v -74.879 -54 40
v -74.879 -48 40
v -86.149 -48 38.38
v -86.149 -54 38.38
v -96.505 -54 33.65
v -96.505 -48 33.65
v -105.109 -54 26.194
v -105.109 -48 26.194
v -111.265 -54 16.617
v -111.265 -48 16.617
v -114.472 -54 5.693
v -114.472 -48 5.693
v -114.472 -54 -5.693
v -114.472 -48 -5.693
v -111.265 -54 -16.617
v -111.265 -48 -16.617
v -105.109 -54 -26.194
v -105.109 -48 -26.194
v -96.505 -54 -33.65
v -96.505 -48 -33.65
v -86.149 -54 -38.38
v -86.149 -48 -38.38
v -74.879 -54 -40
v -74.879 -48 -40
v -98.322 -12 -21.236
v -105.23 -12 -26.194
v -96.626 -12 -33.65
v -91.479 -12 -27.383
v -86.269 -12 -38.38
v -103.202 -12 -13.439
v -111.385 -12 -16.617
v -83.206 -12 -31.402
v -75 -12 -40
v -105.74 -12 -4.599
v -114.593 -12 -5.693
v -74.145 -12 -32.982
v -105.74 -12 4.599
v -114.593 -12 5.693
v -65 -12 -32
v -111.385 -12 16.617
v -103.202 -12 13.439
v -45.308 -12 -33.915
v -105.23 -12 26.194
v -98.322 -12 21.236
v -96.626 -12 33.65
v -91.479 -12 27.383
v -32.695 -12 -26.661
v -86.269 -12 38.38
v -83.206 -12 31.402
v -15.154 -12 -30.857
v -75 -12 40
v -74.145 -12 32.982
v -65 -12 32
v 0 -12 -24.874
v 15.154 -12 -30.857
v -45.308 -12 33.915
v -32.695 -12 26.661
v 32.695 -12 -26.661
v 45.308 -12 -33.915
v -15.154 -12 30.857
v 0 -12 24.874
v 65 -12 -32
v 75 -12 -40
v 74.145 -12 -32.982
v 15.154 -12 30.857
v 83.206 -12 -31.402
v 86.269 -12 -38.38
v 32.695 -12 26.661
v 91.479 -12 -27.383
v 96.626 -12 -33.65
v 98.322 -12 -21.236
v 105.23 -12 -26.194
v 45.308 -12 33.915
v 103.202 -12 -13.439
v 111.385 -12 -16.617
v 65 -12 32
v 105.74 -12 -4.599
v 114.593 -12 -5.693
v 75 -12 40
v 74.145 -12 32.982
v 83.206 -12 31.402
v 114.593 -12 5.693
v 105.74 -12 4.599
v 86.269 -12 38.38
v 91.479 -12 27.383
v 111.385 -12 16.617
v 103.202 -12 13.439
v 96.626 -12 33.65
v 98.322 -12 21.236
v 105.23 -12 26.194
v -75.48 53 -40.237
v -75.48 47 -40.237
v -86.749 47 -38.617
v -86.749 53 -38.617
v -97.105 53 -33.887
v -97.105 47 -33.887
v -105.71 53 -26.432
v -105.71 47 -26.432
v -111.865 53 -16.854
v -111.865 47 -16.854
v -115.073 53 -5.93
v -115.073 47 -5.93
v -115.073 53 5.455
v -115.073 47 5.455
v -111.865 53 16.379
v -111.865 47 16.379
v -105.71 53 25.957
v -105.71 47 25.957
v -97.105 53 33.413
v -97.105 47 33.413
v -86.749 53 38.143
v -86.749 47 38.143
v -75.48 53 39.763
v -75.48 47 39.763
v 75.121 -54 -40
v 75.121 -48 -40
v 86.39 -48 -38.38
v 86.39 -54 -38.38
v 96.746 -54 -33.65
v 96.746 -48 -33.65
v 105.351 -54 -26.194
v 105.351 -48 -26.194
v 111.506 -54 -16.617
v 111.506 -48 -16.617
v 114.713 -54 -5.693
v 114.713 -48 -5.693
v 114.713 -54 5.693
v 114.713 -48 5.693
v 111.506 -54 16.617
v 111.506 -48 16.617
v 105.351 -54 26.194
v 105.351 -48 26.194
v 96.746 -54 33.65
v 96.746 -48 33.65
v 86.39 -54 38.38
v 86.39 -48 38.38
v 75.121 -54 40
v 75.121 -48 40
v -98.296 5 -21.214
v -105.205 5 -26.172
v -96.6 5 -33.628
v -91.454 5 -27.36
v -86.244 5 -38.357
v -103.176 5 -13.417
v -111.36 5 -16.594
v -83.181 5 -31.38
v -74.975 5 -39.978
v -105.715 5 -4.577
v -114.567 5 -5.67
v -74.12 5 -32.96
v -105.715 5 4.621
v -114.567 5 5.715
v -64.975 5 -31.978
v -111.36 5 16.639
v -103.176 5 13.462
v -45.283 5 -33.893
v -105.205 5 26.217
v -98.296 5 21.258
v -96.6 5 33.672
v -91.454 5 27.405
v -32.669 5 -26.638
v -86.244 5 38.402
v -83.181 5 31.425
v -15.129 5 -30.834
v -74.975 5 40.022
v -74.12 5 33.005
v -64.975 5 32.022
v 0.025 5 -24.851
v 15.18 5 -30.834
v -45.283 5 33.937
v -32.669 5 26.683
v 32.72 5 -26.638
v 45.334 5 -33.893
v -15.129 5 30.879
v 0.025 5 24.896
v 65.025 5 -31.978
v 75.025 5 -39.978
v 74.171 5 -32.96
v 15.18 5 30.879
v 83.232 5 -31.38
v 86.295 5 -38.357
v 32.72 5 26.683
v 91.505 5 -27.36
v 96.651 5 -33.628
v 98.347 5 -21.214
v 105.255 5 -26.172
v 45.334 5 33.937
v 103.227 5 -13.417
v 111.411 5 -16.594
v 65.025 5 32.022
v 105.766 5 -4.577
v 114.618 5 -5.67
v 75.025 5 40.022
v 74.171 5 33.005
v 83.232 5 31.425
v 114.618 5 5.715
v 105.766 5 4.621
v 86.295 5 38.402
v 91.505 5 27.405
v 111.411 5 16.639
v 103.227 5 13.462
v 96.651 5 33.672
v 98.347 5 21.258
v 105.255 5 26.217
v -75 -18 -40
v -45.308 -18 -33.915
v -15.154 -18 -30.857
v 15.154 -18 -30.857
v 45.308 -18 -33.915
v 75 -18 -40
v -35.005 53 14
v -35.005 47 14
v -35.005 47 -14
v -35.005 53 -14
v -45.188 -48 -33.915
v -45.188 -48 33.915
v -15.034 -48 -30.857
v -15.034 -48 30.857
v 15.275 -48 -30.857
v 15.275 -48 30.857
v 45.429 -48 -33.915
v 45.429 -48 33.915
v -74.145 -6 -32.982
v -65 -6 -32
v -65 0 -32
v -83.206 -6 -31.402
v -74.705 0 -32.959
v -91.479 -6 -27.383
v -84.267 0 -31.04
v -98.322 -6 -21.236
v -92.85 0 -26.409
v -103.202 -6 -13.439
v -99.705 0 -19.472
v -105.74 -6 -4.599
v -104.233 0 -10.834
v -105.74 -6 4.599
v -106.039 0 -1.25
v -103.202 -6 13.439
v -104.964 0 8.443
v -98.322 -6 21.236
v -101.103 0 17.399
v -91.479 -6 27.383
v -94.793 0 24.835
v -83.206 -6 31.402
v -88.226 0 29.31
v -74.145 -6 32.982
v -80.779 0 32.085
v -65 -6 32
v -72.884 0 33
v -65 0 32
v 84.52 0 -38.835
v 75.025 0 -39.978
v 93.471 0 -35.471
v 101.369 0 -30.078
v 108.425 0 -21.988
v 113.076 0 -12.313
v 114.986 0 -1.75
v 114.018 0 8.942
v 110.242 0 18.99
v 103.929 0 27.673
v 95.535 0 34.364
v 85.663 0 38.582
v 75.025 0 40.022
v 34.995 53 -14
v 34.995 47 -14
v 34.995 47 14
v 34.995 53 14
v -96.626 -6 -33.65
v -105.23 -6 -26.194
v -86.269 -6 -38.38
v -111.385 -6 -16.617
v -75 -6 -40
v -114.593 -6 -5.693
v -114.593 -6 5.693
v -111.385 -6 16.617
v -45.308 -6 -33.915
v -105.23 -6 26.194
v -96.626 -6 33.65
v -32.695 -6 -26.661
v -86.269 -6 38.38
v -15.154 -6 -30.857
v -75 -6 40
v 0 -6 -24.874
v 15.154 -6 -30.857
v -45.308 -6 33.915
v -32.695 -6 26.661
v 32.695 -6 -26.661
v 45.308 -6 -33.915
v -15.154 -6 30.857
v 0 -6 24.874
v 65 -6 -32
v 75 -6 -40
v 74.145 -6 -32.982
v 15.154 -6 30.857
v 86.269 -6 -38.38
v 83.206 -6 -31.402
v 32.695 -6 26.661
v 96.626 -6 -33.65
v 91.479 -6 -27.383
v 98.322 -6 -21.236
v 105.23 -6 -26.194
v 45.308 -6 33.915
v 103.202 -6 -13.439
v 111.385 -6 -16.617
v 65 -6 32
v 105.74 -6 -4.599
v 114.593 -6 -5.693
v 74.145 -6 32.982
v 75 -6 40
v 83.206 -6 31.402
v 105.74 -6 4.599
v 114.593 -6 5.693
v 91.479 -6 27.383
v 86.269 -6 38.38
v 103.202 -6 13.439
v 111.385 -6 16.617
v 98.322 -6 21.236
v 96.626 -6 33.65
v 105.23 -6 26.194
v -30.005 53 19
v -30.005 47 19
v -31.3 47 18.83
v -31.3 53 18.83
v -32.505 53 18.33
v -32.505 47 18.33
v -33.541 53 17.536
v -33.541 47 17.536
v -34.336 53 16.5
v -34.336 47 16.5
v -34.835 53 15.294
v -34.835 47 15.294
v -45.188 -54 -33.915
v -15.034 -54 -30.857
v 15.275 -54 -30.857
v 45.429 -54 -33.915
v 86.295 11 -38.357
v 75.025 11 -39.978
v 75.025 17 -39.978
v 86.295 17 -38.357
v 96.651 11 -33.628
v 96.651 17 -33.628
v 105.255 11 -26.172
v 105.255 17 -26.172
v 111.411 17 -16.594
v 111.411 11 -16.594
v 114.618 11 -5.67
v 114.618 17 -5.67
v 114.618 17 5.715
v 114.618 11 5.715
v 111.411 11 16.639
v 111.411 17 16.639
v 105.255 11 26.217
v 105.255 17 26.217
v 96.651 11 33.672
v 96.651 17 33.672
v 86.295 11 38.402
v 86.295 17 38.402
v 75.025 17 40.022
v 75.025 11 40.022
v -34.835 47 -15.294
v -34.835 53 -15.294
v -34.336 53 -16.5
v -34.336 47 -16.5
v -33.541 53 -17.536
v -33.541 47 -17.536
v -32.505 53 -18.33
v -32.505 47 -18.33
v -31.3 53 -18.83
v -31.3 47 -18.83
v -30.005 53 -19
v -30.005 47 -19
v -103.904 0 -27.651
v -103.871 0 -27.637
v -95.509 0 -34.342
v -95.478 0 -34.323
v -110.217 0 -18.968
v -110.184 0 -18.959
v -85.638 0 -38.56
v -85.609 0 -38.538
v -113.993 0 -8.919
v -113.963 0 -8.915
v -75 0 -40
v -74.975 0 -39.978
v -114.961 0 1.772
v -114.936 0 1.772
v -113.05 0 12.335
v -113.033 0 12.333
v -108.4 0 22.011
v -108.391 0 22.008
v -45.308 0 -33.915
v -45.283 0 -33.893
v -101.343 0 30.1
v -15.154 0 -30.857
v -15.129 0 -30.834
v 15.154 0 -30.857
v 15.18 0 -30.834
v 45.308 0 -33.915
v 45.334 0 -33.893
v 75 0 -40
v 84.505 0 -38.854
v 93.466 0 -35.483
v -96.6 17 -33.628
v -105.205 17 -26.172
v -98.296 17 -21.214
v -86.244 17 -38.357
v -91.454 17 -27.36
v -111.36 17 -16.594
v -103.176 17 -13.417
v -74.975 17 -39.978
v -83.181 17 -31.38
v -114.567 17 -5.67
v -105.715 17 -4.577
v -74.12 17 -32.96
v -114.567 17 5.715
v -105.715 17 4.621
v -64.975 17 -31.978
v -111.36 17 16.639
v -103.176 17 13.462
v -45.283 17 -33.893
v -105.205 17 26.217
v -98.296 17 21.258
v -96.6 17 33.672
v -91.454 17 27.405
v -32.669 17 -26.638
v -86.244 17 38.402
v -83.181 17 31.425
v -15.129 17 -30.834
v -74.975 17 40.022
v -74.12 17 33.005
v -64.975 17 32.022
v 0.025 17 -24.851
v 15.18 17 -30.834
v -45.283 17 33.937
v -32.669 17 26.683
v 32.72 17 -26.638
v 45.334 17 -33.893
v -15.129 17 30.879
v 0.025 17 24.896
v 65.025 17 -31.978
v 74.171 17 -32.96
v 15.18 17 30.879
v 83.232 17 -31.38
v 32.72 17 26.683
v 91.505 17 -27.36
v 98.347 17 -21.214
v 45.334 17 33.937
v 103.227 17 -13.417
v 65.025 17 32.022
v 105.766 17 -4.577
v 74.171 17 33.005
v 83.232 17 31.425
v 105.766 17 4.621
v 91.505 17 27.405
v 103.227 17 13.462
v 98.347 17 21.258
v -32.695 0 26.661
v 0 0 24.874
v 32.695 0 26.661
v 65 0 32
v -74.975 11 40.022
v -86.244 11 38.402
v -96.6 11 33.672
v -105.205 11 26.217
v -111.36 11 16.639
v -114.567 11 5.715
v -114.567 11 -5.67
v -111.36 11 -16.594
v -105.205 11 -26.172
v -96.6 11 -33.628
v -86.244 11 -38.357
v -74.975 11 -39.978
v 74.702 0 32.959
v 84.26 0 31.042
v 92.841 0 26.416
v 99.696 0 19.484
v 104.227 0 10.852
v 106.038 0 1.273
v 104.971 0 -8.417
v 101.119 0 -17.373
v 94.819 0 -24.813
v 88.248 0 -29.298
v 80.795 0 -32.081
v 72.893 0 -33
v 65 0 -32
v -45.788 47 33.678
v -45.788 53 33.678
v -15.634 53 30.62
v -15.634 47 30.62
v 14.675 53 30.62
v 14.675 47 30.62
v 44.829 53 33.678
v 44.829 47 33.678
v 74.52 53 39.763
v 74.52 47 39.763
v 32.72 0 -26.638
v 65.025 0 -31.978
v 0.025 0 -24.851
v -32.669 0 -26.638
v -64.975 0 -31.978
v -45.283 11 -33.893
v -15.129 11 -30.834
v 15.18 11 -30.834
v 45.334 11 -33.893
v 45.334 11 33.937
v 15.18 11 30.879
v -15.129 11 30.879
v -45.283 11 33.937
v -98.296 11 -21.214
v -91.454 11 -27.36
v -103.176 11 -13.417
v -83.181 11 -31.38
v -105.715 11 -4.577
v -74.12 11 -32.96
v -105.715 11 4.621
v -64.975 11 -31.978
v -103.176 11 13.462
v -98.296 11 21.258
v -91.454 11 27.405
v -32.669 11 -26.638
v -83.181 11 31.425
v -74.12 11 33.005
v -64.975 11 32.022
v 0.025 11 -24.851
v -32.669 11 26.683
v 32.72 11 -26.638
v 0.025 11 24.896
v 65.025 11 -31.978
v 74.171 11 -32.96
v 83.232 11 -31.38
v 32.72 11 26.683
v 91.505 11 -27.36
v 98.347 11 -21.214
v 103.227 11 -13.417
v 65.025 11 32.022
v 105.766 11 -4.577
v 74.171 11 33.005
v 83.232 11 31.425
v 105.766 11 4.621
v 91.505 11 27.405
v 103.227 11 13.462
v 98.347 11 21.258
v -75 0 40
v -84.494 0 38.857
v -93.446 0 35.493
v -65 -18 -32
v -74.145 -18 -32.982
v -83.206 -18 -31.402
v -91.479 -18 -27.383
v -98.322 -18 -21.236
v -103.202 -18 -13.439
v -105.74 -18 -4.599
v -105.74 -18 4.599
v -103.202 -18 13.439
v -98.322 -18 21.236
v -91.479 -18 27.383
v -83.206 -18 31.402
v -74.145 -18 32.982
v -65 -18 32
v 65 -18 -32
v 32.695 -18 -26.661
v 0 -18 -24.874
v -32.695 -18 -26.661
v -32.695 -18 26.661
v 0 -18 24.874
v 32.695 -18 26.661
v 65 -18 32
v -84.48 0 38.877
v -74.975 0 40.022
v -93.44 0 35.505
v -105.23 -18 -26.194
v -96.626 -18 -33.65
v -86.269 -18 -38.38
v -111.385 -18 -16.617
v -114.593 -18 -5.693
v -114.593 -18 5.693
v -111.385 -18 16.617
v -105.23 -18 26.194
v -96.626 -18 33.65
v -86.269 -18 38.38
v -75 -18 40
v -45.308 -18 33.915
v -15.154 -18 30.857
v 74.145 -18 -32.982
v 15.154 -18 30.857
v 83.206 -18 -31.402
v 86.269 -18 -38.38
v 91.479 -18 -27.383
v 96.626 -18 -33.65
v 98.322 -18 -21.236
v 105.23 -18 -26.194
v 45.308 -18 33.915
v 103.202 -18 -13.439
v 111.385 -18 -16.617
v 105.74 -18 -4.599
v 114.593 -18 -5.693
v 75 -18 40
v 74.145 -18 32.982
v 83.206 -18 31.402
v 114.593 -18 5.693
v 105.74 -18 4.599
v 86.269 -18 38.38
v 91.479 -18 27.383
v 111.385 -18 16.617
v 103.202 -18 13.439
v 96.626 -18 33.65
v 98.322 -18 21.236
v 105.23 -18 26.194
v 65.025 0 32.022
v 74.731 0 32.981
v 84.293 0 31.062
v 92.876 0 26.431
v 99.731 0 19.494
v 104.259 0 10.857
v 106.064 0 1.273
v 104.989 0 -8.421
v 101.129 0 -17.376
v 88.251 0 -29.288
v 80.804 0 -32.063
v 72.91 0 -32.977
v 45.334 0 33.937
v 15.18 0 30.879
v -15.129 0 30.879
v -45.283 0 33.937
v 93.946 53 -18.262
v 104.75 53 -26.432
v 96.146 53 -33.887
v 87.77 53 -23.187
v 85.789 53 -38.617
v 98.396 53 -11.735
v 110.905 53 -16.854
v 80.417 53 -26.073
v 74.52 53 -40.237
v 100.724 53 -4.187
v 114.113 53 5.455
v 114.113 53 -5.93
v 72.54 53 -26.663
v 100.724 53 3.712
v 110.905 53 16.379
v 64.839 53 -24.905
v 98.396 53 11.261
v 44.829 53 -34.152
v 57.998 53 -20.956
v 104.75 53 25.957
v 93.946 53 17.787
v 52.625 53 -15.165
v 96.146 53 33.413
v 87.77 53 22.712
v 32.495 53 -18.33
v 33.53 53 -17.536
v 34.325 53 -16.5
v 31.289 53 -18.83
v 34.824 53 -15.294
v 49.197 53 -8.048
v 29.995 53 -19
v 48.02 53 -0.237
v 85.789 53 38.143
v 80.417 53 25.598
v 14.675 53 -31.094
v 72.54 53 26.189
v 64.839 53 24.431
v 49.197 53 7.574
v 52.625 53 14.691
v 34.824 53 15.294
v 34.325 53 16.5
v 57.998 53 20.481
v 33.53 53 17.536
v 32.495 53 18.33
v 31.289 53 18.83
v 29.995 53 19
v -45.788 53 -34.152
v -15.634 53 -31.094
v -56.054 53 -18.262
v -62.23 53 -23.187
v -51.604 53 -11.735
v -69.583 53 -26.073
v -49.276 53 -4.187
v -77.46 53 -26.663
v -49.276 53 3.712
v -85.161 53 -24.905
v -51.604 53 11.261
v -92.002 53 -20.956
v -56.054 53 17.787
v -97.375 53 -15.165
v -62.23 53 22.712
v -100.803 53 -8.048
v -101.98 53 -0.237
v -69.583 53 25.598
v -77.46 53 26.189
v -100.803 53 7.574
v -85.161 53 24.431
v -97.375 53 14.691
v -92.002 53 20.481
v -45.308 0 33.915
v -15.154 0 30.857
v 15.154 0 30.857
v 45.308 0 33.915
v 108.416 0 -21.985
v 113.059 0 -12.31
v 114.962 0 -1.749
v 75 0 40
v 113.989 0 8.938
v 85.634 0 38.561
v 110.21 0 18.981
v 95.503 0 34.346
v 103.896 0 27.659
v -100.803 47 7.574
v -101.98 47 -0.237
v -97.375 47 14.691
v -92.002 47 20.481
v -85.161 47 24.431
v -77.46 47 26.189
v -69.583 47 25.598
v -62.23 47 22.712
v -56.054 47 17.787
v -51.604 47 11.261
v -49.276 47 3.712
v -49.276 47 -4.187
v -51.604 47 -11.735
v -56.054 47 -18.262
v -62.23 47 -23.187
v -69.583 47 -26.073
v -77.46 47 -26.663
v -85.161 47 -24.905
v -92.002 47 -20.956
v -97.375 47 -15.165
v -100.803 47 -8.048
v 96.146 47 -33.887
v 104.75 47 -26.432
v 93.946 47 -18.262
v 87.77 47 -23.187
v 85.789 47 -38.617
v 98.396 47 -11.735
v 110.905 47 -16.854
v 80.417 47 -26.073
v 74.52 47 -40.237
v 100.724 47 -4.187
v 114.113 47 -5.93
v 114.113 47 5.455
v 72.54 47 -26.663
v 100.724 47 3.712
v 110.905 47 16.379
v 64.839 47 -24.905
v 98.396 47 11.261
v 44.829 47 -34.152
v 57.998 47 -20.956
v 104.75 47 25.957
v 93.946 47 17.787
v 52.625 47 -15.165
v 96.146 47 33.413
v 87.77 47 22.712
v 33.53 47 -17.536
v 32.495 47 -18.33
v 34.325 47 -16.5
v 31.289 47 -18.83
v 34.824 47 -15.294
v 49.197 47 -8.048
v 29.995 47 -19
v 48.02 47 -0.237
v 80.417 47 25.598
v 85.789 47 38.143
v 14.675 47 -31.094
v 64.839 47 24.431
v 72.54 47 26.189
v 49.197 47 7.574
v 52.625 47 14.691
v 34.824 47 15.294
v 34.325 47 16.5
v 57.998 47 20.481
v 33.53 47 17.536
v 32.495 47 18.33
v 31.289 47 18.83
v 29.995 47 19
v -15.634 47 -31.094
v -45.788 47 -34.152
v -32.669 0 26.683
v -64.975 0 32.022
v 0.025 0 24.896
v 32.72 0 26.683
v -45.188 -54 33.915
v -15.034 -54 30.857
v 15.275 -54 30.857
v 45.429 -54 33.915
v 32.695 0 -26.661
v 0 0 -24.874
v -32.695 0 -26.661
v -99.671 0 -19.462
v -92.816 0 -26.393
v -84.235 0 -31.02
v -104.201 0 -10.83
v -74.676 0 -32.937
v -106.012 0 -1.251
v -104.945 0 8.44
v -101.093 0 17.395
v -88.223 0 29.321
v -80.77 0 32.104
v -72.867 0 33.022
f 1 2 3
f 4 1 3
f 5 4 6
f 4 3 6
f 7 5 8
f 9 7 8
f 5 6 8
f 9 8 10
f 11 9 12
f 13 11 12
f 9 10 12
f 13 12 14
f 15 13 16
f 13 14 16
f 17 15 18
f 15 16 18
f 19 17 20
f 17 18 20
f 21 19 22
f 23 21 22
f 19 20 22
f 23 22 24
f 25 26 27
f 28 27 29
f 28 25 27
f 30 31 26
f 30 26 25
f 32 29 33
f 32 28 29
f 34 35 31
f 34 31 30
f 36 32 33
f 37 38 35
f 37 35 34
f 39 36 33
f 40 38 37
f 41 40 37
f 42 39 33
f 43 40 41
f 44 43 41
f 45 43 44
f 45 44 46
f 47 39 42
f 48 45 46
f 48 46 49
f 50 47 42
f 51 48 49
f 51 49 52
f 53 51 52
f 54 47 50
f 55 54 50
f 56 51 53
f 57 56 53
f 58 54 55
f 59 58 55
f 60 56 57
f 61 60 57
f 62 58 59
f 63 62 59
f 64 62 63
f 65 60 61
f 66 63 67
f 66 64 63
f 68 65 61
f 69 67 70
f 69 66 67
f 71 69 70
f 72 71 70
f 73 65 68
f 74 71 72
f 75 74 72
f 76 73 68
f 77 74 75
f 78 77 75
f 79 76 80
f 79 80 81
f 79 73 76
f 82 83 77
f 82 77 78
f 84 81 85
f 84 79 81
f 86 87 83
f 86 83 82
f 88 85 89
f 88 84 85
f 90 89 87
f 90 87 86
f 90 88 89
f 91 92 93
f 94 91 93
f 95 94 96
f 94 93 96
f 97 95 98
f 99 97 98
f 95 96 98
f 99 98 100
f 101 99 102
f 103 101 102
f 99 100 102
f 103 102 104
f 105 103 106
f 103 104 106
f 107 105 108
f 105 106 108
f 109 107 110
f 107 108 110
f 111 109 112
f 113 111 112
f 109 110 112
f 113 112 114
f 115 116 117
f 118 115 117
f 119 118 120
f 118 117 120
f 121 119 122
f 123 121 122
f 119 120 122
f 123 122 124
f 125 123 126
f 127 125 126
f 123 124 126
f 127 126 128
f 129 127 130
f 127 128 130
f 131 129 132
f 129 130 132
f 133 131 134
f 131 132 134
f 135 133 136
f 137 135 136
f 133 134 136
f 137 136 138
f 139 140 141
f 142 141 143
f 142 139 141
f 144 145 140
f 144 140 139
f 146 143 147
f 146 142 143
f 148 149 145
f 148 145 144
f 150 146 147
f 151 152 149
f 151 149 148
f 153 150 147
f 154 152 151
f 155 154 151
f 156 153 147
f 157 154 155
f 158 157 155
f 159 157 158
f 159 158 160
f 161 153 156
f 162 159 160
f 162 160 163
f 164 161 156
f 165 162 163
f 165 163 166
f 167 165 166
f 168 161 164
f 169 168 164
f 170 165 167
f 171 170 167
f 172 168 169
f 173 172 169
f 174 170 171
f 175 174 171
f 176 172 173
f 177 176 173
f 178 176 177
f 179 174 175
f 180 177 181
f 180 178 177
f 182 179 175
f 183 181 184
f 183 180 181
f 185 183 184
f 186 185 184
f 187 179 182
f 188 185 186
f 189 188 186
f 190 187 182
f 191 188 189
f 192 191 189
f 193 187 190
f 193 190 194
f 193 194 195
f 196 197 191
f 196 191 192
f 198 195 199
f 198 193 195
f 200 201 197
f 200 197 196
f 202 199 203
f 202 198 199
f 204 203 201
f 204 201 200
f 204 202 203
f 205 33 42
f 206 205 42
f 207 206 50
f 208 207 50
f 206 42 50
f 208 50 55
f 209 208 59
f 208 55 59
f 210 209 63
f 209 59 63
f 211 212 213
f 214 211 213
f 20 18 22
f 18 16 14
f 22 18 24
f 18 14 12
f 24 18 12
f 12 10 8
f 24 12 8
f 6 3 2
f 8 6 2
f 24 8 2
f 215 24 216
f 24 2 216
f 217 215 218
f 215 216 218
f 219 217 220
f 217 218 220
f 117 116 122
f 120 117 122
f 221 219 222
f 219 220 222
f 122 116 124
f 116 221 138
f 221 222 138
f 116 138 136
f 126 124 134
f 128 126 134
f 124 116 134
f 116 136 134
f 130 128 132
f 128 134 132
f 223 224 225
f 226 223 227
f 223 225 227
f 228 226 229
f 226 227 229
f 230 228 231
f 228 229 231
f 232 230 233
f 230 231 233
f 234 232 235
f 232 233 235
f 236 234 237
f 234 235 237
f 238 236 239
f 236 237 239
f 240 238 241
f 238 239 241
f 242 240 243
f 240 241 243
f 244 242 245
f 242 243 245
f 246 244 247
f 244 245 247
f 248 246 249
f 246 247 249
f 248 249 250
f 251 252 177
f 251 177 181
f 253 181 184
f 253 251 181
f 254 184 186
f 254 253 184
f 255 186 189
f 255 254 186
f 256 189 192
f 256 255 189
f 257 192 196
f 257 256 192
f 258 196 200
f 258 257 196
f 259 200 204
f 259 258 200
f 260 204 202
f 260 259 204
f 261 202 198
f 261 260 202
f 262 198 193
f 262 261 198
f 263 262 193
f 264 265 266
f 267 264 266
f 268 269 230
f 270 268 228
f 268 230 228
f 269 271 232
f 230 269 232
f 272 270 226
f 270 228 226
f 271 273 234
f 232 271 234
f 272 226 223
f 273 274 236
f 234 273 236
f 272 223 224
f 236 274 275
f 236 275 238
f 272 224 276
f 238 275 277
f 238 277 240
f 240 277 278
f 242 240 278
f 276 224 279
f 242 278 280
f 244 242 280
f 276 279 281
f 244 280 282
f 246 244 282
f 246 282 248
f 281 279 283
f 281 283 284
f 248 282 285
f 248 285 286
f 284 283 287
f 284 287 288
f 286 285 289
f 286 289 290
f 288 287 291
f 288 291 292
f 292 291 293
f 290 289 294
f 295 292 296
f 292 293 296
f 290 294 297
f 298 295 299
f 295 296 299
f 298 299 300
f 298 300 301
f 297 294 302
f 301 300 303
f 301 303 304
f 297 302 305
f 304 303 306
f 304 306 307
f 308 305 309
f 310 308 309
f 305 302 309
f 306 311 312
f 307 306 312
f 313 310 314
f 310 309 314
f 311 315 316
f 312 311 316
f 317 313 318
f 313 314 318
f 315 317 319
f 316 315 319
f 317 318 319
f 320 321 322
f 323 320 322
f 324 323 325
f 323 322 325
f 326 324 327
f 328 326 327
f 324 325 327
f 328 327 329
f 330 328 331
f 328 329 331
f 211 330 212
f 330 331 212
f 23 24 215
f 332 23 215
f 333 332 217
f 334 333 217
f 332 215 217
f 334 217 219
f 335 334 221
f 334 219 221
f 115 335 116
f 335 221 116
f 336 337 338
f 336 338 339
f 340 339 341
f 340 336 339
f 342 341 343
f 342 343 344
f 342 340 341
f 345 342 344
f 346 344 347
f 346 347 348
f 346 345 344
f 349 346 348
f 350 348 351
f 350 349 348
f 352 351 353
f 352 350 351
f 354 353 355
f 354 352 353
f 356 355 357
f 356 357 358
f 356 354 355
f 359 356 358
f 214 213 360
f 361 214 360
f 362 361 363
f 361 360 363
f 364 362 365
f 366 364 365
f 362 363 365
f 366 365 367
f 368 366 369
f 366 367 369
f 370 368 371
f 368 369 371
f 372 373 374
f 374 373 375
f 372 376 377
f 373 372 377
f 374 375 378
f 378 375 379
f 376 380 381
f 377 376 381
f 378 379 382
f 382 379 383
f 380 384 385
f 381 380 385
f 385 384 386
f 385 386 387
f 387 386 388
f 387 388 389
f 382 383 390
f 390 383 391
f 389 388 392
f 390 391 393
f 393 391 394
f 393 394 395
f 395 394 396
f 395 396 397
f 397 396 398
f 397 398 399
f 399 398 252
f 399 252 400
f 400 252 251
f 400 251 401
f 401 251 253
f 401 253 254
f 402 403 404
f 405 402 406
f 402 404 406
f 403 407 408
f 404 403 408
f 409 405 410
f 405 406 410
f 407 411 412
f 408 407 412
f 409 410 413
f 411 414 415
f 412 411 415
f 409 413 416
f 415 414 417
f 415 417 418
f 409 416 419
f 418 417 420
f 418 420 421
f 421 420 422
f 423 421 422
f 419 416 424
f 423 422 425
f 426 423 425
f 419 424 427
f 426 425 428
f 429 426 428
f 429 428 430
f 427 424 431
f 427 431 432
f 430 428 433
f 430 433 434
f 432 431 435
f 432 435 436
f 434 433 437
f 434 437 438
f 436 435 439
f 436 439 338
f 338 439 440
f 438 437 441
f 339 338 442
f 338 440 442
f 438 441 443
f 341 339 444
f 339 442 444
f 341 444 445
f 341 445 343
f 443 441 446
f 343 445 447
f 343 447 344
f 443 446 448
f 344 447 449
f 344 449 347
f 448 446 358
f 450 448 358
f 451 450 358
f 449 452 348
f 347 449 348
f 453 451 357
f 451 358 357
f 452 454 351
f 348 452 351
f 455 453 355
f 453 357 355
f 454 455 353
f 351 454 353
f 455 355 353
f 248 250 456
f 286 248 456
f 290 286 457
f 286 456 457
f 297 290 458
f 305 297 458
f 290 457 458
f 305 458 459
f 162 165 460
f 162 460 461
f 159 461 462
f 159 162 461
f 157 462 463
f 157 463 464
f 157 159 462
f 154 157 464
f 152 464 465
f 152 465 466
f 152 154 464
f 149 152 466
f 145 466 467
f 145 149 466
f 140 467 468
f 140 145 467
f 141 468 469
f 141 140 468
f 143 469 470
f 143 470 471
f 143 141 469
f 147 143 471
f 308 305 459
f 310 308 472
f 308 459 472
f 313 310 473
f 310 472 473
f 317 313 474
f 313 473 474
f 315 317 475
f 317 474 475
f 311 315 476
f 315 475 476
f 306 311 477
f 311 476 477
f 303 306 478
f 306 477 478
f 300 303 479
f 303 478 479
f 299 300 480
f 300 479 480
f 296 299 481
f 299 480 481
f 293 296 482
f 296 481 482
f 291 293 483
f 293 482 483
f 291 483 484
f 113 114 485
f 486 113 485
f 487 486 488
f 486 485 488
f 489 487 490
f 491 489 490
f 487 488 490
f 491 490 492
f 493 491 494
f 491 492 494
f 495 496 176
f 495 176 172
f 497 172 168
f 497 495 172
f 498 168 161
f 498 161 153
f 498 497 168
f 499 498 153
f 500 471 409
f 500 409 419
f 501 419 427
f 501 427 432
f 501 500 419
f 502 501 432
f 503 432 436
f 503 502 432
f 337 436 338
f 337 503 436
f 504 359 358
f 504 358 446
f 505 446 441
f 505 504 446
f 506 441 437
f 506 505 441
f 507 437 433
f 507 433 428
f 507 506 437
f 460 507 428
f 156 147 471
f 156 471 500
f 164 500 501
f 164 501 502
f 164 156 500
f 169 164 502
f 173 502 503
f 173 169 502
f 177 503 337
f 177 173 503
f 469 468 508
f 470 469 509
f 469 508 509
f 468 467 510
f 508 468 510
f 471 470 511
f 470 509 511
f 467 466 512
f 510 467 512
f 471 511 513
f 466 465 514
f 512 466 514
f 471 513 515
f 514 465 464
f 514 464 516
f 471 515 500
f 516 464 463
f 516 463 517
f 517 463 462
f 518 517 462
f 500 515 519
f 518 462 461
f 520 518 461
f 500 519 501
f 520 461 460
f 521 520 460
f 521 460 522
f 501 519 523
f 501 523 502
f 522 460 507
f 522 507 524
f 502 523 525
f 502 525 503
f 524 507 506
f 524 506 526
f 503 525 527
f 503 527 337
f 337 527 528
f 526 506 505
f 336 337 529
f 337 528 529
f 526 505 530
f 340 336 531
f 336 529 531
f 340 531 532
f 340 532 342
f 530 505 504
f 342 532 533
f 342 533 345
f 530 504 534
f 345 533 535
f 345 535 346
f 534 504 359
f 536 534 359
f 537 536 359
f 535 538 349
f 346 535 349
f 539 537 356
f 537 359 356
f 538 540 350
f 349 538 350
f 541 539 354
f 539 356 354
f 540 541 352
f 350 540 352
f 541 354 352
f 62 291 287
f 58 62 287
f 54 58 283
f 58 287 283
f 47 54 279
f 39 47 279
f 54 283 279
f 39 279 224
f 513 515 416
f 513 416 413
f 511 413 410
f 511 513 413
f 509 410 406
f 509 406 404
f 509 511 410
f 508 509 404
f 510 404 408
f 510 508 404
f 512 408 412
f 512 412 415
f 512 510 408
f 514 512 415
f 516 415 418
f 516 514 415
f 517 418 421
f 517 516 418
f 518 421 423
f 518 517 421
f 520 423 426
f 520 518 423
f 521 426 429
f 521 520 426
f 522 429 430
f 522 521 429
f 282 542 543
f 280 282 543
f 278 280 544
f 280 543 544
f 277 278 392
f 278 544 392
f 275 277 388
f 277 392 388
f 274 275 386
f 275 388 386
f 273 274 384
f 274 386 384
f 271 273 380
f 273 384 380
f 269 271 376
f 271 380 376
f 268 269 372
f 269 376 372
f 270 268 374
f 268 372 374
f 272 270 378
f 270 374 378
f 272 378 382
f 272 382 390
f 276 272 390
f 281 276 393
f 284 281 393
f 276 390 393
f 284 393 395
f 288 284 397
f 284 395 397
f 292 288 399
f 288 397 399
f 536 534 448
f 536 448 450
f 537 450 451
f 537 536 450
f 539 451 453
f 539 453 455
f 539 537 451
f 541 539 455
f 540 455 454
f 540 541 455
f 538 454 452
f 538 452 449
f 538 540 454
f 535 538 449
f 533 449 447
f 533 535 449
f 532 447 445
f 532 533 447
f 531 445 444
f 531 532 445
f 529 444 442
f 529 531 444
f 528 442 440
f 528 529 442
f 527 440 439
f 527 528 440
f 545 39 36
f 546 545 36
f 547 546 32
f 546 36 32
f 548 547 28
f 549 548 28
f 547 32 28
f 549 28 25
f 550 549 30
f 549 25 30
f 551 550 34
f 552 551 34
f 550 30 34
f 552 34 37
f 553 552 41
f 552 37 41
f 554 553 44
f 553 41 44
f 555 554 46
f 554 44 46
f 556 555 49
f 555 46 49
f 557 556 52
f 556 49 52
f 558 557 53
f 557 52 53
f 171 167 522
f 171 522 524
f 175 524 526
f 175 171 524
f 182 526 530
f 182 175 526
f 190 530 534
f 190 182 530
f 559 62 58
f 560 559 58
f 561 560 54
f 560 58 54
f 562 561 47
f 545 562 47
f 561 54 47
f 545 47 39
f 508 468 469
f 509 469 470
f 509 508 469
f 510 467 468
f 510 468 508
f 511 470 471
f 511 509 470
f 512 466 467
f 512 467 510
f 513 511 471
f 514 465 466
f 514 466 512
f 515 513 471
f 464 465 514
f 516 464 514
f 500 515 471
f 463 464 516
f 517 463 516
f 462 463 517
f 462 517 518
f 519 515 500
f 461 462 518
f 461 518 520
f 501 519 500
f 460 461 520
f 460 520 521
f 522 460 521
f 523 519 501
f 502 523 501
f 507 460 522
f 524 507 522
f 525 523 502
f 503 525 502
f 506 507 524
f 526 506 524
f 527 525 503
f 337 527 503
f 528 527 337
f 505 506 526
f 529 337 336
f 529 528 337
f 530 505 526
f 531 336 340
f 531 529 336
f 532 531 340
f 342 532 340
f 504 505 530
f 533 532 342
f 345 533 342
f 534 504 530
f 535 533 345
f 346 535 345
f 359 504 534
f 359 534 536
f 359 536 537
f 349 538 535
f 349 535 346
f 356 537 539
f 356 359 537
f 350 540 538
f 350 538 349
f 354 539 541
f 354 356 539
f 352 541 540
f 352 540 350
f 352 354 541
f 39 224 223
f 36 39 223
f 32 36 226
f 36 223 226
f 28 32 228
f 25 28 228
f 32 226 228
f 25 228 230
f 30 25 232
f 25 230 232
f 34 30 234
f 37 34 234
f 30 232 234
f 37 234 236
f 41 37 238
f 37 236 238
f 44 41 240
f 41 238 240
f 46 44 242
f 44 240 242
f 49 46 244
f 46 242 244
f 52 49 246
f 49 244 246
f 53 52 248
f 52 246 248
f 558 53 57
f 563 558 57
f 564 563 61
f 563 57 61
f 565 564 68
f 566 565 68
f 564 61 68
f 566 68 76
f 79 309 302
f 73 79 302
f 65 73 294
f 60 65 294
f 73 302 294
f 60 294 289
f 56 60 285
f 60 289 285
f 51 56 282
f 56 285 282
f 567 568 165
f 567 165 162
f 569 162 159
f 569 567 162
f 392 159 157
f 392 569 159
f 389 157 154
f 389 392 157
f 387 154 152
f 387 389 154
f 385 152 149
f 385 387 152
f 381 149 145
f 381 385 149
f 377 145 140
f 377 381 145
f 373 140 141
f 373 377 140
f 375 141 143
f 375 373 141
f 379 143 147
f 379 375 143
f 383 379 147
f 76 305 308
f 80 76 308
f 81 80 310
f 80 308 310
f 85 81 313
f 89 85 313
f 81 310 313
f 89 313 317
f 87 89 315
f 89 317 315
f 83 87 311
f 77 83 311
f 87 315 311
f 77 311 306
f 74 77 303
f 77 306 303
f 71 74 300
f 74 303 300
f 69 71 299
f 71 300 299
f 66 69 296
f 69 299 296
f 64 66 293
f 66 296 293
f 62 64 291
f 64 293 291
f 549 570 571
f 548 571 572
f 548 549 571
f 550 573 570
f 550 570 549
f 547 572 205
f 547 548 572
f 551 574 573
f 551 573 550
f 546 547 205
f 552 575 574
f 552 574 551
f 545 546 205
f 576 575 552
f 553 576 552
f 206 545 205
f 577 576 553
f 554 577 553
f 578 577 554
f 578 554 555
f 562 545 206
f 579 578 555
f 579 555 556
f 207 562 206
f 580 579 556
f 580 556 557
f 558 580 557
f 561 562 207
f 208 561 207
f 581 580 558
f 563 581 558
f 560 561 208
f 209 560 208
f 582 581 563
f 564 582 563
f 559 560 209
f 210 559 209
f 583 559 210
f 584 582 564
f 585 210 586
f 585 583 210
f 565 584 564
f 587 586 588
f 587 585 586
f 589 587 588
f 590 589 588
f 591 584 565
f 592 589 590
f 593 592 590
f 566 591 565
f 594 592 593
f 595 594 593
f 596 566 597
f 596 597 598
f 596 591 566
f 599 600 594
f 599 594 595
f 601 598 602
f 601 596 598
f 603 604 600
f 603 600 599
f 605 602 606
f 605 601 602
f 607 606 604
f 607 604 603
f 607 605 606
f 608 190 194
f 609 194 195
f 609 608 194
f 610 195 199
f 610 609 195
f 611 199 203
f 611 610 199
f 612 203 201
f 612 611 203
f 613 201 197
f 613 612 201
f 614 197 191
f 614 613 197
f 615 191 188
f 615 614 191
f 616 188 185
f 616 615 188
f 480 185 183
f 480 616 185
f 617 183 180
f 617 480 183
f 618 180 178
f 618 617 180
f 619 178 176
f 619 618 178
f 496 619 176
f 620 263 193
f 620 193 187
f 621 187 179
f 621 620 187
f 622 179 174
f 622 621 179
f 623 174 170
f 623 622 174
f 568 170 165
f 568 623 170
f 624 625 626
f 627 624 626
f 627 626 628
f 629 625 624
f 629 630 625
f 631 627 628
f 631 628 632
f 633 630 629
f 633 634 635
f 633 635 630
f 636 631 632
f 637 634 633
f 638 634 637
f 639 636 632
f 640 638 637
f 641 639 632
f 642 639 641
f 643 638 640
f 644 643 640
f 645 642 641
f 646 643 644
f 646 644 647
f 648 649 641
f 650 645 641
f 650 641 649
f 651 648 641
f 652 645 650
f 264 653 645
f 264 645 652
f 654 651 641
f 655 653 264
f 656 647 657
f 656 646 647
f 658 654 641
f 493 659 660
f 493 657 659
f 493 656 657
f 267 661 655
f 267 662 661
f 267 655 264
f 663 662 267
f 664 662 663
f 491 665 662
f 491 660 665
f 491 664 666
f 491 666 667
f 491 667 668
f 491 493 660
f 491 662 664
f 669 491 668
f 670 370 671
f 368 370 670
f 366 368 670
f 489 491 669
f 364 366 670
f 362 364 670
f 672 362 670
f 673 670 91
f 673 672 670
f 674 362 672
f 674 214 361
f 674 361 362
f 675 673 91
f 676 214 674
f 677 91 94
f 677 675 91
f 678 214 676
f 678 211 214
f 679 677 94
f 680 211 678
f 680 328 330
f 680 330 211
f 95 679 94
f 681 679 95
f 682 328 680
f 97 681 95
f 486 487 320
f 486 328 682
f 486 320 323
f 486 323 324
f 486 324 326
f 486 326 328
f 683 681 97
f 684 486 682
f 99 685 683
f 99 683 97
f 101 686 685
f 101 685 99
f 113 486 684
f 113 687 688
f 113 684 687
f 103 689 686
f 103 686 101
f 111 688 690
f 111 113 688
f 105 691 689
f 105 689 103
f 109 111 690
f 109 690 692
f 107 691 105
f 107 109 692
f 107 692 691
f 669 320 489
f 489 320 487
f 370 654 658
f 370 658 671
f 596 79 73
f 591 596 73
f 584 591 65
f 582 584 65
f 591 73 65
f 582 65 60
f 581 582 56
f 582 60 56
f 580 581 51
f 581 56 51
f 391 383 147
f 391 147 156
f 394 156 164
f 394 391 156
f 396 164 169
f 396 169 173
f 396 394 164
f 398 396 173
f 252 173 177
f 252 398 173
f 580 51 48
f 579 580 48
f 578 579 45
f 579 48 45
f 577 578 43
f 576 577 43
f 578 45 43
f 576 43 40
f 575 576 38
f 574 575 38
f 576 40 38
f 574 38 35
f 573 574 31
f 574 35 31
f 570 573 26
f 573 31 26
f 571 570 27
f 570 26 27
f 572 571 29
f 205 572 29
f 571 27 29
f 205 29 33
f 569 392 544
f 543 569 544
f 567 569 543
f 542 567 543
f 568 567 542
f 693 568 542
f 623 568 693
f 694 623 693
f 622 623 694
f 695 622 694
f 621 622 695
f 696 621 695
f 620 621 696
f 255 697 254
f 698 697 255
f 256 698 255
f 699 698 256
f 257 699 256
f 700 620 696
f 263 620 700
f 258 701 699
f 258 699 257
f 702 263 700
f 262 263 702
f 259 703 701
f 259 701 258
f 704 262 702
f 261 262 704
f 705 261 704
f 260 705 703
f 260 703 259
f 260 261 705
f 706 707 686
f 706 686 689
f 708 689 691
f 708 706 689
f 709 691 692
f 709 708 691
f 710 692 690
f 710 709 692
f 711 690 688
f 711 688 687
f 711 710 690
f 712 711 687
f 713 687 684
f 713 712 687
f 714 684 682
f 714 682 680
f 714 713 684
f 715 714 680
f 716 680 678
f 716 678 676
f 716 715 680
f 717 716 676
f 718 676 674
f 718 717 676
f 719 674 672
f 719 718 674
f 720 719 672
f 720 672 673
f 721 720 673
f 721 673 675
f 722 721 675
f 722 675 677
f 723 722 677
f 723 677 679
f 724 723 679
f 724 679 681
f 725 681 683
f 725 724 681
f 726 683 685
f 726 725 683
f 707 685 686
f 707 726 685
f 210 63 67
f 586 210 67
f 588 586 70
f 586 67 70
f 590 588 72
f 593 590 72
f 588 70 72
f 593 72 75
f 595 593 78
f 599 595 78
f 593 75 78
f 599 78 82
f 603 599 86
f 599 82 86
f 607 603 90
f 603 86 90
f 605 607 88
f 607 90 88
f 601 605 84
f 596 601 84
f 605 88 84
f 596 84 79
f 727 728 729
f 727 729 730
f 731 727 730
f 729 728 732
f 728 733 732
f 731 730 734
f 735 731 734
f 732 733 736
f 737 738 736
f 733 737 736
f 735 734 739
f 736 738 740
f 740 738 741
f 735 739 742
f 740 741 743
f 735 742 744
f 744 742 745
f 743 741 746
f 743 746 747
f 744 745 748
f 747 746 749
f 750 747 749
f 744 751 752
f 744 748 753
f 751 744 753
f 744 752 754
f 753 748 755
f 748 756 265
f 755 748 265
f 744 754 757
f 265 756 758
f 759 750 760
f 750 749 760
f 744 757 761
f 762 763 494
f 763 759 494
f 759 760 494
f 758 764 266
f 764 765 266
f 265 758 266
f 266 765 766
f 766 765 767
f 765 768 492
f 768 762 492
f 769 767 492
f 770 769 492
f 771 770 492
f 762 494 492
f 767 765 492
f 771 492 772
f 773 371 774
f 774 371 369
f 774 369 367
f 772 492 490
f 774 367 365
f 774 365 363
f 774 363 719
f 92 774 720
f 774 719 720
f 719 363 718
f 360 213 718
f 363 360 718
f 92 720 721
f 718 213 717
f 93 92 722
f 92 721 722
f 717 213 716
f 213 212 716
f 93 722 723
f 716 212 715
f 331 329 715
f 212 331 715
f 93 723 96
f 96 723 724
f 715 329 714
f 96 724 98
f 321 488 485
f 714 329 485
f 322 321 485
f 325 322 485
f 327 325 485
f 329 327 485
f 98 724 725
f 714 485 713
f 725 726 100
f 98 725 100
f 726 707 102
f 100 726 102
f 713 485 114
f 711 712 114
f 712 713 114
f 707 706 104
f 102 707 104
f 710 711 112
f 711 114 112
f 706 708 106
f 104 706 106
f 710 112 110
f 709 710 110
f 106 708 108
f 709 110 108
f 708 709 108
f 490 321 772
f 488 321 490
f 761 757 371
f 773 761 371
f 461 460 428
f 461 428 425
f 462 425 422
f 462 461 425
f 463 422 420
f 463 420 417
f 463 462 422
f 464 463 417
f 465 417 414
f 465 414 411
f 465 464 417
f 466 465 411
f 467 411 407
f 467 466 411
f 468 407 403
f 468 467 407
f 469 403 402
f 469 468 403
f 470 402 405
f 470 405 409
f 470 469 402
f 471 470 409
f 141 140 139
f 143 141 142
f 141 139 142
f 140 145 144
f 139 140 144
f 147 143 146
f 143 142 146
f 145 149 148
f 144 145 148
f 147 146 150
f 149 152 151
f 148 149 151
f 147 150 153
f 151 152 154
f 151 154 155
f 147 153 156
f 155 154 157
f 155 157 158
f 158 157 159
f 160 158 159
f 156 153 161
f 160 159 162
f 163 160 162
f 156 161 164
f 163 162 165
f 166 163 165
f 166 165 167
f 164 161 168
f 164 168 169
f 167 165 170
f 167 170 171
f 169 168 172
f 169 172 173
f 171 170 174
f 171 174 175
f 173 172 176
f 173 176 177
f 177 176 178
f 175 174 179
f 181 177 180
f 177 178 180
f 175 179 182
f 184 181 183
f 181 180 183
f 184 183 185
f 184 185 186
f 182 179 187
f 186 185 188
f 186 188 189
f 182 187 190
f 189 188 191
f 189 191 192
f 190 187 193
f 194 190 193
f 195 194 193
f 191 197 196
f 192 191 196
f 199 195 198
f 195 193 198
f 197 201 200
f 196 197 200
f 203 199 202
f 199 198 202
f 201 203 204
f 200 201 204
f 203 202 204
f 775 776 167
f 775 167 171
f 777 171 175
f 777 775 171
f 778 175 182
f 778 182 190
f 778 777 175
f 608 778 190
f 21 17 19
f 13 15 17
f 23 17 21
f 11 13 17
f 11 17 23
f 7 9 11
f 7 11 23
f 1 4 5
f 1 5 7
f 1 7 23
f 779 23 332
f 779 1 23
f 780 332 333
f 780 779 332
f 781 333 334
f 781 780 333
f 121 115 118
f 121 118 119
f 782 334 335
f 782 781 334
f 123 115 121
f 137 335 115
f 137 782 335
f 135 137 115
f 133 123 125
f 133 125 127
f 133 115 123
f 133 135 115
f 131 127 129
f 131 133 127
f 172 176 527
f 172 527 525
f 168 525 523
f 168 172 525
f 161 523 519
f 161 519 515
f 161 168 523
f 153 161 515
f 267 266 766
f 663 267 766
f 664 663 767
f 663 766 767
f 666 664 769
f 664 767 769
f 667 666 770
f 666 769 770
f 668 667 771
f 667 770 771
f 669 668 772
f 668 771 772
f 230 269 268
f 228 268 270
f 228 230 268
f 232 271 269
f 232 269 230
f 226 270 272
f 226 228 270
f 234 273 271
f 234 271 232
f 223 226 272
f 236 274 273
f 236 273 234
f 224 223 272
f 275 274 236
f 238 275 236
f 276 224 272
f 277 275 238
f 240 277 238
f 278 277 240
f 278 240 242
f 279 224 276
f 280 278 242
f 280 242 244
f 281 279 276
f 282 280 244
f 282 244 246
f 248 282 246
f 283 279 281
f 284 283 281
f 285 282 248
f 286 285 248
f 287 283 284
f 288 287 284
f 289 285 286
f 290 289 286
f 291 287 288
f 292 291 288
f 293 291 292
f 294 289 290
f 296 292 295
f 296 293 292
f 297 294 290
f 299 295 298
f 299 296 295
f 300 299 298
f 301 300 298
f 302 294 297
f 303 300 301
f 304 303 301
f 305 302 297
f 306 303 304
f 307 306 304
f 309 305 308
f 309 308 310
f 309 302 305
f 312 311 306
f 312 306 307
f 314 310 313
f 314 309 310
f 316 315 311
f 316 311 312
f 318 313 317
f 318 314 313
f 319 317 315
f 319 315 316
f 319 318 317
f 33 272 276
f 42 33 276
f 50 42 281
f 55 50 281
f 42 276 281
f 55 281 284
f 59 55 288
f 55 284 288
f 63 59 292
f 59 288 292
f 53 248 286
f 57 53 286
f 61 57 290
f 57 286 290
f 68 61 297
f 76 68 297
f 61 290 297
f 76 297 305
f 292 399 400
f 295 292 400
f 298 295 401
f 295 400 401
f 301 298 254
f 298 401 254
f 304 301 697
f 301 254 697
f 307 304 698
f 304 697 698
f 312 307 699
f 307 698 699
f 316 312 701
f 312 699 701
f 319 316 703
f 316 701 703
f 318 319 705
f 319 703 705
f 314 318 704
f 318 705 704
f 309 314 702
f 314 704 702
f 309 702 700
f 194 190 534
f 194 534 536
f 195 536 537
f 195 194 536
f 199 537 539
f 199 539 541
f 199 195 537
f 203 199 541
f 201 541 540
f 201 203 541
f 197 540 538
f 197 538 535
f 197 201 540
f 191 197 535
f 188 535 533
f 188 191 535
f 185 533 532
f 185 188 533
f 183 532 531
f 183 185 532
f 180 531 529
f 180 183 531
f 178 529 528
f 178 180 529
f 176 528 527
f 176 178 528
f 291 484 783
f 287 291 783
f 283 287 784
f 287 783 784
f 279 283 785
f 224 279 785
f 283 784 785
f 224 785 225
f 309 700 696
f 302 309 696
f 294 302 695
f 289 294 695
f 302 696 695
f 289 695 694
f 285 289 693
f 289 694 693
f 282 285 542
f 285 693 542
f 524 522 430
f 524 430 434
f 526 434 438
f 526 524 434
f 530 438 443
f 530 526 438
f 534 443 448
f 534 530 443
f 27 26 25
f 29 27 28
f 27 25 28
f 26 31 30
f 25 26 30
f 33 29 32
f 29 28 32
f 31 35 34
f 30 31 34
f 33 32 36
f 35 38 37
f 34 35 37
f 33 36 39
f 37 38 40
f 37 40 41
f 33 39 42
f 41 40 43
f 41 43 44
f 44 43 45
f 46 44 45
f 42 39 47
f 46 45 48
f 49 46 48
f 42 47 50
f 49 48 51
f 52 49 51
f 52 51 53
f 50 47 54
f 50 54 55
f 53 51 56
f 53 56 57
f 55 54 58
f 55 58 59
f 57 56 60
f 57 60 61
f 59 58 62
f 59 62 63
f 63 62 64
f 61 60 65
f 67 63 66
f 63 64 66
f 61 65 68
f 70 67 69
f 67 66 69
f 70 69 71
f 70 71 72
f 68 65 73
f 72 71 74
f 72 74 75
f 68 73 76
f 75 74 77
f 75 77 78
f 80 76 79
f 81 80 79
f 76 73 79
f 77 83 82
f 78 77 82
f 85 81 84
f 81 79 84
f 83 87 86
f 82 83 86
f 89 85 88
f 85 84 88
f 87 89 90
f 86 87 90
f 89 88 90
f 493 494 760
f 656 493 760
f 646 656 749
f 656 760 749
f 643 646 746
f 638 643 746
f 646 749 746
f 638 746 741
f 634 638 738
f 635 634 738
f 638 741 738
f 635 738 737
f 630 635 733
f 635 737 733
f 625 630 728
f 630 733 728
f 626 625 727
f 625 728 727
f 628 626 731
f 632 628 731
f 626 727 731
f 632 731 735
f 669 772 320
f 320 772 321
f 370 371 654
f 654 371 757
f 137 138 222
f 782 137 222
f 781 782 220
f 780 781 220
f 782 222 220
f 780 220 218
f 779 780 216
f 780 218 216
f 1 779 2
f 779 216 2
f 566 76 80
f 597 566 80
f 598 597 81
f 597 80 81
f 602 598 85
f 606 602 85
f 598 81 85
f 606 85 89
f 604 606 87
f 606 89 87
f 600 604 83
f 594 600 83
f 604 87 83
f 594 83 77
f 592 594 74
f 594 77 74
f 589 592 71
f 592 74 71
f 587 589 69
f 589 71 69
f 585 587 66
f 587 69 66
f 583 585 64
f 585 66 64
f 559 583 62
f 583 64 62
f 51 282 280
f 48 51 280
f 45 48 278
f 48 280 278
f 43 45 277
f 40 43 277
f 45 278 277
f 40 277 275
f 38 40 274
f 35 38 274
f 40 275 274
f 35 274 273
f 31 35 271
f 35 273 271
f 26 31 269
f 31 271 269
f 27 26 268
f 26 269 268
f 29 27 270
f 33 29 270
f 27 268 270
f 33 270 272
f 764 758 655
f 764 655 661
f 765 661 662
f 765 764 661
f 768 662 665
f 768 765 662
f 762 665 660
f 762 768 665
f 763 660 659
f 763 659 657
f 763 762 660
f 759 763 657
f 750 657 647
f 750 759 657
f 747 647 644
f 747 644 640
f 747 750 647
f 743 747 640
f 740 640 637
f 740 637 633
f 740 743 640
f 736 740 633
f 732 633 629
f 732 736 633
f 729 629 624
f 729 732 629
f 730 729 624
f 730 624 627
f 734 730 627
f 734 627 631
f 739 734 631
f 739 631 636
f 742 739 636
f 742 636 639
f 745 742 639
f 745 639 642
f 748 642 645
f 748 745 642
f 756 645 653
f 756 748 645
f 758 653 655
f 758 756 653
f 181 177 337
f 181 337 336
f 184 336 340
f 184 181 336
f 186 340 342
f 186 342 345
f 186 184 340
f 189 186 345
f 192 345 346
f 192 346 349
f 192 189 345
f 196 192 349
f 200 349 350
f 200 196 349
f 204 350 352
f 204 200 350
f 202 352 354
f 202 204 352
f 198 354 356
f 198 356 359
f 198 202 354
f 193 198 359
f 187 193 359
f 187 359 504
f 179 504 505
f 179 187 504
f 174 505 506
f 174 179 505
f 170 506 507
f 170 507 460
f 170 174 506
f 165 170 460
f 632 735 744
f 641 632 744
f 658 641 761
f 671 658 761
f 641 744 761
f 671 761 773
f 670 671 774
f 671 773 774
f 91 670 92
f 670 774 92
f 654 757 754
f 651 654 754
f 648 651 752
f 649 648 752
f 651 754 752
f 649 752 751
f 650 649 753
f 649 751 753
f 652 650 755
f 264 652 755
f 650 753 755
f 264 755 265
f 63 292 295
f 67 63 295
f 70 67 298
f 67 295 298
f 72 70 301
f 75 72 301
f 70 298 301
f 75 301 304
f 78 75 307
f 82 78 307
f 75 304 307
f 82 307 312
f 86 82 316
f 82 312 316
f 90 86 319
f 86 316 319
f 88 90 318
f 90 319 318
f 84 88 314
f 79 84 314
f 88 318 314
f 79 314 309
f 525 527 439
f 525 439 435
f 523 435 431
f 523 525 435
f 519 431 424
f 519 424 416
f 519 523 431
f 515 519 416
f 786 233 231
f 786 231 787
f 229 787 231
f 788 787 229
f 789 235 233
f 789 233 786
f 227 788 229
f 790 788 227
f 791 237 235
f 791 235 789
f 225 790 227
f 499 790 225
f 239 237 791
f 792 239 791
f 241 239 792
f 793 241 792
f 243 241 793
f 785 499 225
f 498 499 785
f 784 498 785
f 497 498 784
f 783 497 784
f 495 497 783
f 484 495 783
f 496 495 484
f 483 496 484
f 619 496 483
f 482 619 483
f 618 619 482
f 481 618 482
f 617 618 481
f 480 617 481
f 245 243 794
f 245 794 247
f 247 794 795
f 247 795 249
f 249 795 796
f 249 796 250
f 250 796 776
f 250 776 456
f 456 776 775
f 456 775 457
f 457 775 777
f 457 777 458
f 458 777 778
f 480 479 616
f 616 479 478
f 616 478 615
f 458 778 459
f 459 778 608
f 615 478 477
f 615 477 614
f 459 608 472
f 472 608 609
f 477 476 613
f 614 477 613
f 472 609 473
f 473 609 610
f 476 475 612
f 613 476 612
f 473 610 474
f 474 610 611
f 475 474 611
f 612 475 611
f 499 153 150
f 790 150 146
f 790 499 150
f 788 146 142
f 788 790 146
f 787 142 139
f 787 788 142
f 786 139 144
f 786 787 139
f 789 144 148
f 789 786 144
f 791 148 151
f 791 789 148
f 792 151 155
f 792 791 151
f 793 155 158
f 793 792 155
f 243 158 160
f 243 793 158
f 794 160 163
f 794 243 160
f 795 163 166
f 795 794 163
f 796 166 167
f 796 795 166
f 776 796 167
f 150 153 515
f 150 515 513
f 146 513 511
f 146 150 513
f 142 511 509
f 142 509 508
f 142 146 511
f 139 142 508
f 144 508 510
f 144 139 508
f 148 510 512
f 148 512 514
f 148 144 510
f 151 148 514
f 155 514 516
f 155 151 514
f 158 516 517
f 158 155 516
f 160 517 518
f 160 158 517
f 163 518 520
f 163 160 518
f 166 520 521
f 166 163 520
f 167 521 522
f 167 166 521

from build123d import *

# Parameters (mm, degrees)
F1_DEPTH  = 6
F3_DEPTH  = 5
F4_DEPTH  = 6
F5_DEPTH  = 6
F6_DEPTH  = 6
F7_DEPTH  = 6
F10_DEPTH = 6
F12_R     = 26.5
F13_DEPTH = 6


with BuildPart() as f1:
    # F0 (on Front) → F1 (new body)
    with BuildSketch(Plane.XZ):
        with BuildLine():
            ThreePointArc((-75, -40), (0, -30.4737509656), (75, -40))
            ThreePointArc((75, -40), (115, 0), (75, 40))
            ThreePointArc((75, 40), (0, 30.4737509656), (-75, 40))
            ThreePointArc((-75, 40), (-115, 0), (-75, -40))
        make_face()
        with BuildLine():
            ThreePointArc((-65, -32), (-106.0622577483, 0), (-65, 32))
            ThreePointArc((-65, 32), (0, 24.8736929121), (65, 32))
            ThreePointArc((65, 32), (106.0622577483, 0), (65, -32))
            ThreePointArc((65, -32), (0, -24.8736929121), (-65, -32))
        make_face(mode=Mode.SUBTRACT)
    extrude(amount=F1_DEPTH)

    # F2 (on Front) → F3 (join)
    with BuildSketch(Plane.XZ):
        with BuildLine():
            ThreePointArc((-74.9745267705, -39.977687401), (0.0254732295, -30.4514383666), (75.0254732295, -39.977687401))
            ThreePointArc((75.0254732295, -39.977687401), (115.0254732295, 0.022312599), (75.0254732295, 40.022312599))
            ThreePointArc((75.0254732295, 40.022312599), (0.0254732295, 30.4960635645), (-74.9745267705, 40.022312599))
            ThreePointArc((-74.9745267705, 40.022312599), (-114.9745267705, 0.022312599), (-74.9745267705, -39.977687401))
        make_face()
        with BuildLine():
            ThreePointArc((-64.9745267705, -31.977687401), (-106.0367845188, 0.022312599), (-64.9745267705, 32.022312599))
            ThreePointArc((-64.9745267705, 32.022312599), (0.0254732295, 24.8960055111), (65.0254732295, 32.022312599))
            ThreePointArc((65.0254732295, 32.022312599), (106.0877309778, 0.022312599), (65.0254732295, -31.977687401))
            ThreePointArc((65.0254732295, -31.977687401), (0.0254732295, -24.8513803132), (-64.9745267705, -31.977687401))
        make_face(mode=Mode.SUBTRACT)
    extrude(amount=-F3_DEPTH)


with BuildPart() as f4:
    # F4 (new): a face of the model
    f4_faces = [f1.part.faces().sort_by_distance(p)[0] for p in [
        (112.5648408676, -6, 0),
    ]]
    extrude(f4_faces, amount=F4_DEPTH)


with BuildPart() as f5:
    # F5 (new): a face of the model
    f5_faces = [f1.part.faces().sort_by_distance(p)[0] for p in [
        (0.0254732295, 5, -28.0162792342),
    ]]
    extrude(f5_faces, amount=F5_DEPTH)


with BuildPart() as f6:
    # F6 (new): a face of the model
    f6_faces = [f5.part.faces().sort_by_distance(p)[0] for p in [
        (0.0254732295, 11, -28.0162792342),
    ]]
    extrude(f6_faces, amount=F6_DEPTH)


with BuildPart() as f7:
    # F7 (new): a face of the model
    f7_faces = [f4.part.faces().sort_by_distance(p)[0] for p in [
        (112.5648408676, -12, 0),
    ]]
    extrude(f7_faces, amount=F7_DEPTH)


with BuildPart() as f10:
    # F9 (on offset) → F10 (new body)
    with BuildSketch(Plane.XZ.offset(48)):
        with BuildLine():
            ThreePointArc((-74.8794772328, -40), (0.1205227672, -30.4737509656), (75.1205227672, -40))
            ThreePointArc((75.1205227672, -40), (115.1205227672, 0), (75.1205227672, 40))
            ThreePointArc((75.1205227672, 40), (0.1205227672, 30.4737509656), (-74.8794772328, 40))
            ThreePointArc((-74.8794772328, 40), (-114.8794772328, 0), (-74.8794772328, -40))
        make_face()
    extrude(amount=F10_DEPTH)


with BuildPart() as f13:
    # F12 (on offset) → F13 (new body)
    with BuildSketch(Plane(origin=(0, 47, 0), x_dir=(-1, 0, 0), z_dir=(0, 1, 0))):
        with BuildLine():
            ThreePointArc((-74.5201730926, -40.2371987939), (0.4798269074, -30.7109497595), (75.4798269074, -40.2371987939))
            ThreePointArc((75.4798269074, -40.2371987939), (115.4798269074, -0.2371987939), (75.4798269074, 39.7628012061))
            ThreePointArc((75.4798269074, 39.7628012061), (0.4798269074, 30.2365521716), (-74.5201730926, 39.7628012061))
            ThreePointArc((-74.5201730926, 39.7628012061), (-114.5201730926, -0.2371987939), (-74.5201730926, -40.2371987939))
        make_face()
        with Locations((-74.5201730926, -0.2371987939)):
            Circle(F12_R, mode=Mode.SUBTRACT)
        with BuildLine():
            Line((-29.9945702561, 19), (30.0054297439, 19))
            ThreePointArc((30.0054297439, 19), (33.5409636498, 17.5355339059), (35.0054297439, 14))
            Line((35.0054297439, 14), (35.0054297439, -14))
            ThreePointArc((35.0054297439, -14), (33.5409636498, -17.5355339059), (30.0054297439, -19))
            Line((30.0054297439, -19), (-29.9945702561, -19))
            ThreePointArc((-29.9945702561, -19), (-33.5301041621, -17.5355339059), (-34.9945702561, -14))
            Line((-34.9945702561, -14), (-34.9945702561, 14))
            ThreePointArc((-34.9945702561, 14), (-33.5301041621, 17.5355339059), (-29.9945702561, 19))
        make_face(mode=Mode.SUBTRACT)
        with Locations((75.4798269074, -0.2371987939)):
            Circle(F12_R, mode=Mode.SUBTRACT)
    extrude(amount=F13_DEPTH)


solid = Compound([f1.part, f4.part, f5.part, f6.part, f7.part, f10.part, f13.part])
